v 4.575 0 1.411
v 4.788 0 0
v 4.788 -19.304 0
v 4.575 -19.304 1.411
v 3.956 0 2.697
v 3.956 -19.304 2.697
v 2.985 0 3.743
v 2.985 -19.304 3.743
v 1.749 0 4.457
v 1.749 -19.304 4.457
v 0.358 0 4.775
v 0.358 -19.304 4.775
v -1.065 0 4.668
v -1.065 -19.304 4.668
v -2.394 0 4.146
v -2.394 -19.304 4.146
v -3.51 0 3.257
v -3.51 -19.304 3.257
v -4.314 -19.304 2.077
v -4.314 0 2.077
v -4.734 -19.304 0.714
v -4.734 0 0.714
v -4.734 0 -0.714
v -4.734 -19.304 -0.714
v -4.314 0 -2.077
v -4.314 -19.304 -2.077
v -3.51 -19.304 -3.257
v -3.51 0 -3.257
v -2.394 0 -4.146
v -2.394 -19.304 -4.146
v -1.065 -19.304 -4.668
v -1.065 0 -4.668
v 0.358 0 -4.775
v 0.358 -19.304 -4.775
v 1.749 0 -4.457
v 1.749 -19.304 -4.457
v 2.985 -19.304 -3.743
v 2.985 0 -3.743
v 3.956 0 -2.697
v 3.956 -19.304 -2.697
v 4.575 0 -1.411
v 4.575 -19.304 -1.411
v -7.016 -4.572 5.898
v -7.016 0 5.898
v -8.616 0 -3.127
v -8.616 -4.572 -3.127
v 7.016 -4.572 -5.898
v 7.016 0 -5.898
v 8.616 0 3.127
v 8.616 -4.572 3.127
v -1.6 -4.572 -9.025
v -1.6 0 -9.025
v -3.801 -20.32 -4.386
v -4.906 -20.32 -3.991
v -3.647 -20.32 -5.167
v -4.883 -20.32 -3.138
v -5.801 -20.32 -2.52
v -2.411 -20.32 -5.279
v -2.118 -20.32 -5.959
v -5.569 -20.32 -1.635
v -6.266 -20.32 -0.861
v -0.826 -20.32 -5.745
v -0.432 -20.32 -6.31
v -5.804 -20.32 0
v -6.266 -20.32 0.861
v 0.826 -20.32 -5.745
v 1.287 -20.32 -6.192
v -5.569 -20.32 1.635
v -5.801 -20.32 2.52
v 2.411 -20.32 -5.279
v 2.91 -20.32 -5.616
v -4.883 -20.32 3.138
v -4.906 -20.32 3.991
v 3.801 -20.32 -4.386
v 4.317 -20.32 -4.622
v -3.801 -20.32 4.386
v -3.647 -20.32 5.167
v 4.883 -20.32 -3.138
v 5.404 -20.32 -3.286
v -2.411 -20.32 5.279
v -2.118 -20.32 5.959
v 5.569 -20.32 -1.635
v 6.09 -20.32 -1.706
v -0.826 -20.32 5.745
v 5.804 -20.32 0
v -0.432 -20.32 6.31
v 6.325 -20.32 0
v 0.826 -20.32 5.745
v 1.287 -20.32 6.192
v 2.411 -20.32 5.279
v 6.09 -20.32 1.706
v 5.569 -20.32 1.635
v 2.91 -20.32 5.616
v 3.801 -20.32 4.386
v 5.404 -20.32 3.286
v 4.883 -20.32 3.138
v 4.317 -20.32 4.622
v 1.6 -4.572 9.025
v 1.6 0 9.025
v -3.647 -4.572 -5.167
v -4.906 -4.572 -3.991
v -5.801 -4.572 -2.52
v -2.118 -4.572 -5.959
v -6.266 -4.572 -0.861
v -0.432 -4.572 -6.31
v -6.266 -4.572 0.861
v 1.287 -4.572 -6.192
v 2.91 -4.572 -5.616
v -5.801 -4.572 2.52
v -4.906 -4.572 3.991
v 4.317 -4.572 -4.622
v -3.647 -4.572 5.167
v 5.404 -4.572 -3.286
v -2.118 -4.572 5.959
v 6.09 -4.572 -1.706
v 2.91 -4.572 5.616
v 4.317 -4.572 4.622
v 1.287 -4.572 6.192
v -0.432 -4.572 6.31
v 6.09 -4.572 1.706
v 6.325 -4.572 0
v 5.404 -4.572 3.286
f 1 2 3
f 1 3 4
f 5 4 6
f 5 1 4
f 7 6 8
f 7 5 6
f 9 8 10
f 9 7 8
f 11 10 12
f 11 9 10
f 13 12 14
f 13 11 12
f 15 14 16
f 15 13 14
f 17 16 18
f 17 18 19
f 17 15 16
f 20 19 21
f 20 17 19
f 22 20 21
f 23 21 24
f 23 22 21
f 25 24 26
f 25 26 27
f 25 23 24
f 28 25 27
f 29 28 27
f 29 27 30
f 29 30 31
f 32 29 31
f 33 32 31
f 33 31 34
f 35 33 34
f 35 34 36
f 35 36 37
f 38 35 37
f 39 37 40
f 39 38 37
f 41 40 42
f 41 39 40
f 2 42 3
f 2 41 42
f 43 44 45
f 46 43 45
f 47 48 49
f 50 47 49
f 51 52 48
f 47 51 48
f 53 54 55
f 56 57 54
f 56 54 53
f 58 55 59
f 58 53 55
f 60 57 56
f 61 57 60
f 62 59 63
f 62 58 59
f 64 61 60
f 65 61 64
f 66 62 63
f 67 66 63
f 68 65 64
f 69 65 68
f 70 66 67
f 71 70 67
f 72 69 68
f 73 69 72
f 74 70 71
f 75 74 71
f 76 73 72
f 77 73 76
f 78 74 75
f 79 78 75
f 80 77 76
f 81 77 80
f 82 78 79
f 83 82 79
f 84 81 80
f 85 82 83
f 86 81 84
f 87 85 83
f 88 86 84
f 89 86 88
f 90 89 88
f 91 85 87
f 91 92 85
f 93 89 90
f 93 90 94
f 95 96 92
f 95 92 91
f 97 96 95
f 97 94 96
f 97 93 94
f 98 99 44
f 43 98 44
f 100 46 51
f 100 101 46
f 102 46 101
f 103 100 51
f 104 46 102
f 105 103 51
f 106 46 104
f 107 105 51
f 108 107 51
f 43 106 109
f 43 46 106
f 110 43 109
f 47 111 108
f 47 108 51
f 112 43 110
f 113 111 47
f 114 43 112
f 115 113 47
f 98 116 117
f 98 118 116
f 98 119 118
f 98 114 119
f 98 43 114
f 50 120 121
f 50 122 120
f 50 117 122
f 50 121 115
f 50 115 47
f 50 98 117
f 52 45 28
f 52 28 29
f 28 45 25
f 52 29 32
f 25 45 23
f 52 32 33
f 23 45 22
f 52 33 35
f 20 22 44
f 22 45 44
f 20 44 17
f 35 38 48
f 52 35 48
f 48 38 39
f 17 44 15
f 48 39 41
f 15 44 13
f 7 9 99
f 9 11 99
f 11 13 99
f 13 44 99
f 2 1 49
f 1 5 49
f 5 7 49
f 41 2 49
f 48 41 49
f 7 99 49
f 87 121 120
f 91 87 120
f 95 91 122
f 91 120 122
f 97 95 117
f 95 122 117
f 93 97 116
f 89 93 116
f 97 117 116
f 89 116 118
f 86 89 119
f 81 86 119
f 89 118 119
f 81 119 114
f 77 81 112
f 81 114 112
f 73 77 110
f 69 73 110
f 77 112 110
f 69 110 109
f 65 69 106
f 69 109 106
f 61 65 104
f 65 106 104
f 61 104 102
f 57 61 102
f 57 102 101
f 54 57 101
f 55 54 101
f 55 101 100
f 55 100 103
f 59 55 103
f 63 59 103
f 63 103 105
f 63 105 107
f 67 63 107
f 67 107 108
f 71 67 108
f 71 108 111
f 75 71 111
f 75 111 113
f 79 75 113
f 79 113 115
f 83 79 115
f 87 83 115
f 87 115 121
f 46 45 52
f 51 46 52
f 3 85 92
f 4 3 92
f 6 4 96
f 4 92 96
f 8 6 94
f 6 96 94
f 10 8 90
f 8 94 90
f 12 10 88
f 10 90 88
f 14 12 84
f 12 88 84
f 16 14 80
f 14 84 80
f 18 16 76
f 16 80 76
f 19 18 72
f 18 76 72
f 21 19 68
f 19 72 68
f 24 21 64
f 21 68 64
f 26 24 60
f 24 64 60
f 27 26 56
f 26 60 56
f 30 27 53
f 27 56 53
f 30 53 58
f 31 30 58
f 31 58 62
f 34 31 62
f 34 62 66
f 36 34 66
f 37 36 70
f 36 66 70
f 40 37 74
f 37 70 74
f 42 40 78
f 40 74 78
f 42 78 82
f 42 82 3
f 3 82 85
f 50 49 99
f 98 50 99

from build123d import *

# Parameters (mm, degrees)
F0_R     = 6.3246
F0_R_2   = 4.7879
F1_DEPTH = 20.32
F2_DEPTH = 4.572
F3_SIZE  = 1.016


with BuildPart() as f1:
    # F0 (on Front) → F1 (new body)
    with BuildSketch(Plane.XZ):
        Circle(F0_R)
        Circle(F0_R_2, mode=Mode.SUBTRACT)
    extrude(amount=F1_DEPTH)

    # F0 (on Front) → F2 (join)
    with BuildSketch(Plane.XZ):
        Polygon((7.015579, -5.898039), (8.615641, 3.12665), (1.600062, 9.024689), (-7.015579, 5.898039), (-8.615641, -3.12665), (-1.600062, -9.024689), align=None)
        Circle(F0_R, mode=Mode.SUBTRACT)
    extrude(amount=F2_DEPTH)

    # F3
    f3_edges = [f1.edges().sort_by_distance(p)[0] for p in [
        (-4.7879, -20.32, 0),
    ]]
    chamfer(f3_edges, length=F3_SIZE)


solid = f1.part
